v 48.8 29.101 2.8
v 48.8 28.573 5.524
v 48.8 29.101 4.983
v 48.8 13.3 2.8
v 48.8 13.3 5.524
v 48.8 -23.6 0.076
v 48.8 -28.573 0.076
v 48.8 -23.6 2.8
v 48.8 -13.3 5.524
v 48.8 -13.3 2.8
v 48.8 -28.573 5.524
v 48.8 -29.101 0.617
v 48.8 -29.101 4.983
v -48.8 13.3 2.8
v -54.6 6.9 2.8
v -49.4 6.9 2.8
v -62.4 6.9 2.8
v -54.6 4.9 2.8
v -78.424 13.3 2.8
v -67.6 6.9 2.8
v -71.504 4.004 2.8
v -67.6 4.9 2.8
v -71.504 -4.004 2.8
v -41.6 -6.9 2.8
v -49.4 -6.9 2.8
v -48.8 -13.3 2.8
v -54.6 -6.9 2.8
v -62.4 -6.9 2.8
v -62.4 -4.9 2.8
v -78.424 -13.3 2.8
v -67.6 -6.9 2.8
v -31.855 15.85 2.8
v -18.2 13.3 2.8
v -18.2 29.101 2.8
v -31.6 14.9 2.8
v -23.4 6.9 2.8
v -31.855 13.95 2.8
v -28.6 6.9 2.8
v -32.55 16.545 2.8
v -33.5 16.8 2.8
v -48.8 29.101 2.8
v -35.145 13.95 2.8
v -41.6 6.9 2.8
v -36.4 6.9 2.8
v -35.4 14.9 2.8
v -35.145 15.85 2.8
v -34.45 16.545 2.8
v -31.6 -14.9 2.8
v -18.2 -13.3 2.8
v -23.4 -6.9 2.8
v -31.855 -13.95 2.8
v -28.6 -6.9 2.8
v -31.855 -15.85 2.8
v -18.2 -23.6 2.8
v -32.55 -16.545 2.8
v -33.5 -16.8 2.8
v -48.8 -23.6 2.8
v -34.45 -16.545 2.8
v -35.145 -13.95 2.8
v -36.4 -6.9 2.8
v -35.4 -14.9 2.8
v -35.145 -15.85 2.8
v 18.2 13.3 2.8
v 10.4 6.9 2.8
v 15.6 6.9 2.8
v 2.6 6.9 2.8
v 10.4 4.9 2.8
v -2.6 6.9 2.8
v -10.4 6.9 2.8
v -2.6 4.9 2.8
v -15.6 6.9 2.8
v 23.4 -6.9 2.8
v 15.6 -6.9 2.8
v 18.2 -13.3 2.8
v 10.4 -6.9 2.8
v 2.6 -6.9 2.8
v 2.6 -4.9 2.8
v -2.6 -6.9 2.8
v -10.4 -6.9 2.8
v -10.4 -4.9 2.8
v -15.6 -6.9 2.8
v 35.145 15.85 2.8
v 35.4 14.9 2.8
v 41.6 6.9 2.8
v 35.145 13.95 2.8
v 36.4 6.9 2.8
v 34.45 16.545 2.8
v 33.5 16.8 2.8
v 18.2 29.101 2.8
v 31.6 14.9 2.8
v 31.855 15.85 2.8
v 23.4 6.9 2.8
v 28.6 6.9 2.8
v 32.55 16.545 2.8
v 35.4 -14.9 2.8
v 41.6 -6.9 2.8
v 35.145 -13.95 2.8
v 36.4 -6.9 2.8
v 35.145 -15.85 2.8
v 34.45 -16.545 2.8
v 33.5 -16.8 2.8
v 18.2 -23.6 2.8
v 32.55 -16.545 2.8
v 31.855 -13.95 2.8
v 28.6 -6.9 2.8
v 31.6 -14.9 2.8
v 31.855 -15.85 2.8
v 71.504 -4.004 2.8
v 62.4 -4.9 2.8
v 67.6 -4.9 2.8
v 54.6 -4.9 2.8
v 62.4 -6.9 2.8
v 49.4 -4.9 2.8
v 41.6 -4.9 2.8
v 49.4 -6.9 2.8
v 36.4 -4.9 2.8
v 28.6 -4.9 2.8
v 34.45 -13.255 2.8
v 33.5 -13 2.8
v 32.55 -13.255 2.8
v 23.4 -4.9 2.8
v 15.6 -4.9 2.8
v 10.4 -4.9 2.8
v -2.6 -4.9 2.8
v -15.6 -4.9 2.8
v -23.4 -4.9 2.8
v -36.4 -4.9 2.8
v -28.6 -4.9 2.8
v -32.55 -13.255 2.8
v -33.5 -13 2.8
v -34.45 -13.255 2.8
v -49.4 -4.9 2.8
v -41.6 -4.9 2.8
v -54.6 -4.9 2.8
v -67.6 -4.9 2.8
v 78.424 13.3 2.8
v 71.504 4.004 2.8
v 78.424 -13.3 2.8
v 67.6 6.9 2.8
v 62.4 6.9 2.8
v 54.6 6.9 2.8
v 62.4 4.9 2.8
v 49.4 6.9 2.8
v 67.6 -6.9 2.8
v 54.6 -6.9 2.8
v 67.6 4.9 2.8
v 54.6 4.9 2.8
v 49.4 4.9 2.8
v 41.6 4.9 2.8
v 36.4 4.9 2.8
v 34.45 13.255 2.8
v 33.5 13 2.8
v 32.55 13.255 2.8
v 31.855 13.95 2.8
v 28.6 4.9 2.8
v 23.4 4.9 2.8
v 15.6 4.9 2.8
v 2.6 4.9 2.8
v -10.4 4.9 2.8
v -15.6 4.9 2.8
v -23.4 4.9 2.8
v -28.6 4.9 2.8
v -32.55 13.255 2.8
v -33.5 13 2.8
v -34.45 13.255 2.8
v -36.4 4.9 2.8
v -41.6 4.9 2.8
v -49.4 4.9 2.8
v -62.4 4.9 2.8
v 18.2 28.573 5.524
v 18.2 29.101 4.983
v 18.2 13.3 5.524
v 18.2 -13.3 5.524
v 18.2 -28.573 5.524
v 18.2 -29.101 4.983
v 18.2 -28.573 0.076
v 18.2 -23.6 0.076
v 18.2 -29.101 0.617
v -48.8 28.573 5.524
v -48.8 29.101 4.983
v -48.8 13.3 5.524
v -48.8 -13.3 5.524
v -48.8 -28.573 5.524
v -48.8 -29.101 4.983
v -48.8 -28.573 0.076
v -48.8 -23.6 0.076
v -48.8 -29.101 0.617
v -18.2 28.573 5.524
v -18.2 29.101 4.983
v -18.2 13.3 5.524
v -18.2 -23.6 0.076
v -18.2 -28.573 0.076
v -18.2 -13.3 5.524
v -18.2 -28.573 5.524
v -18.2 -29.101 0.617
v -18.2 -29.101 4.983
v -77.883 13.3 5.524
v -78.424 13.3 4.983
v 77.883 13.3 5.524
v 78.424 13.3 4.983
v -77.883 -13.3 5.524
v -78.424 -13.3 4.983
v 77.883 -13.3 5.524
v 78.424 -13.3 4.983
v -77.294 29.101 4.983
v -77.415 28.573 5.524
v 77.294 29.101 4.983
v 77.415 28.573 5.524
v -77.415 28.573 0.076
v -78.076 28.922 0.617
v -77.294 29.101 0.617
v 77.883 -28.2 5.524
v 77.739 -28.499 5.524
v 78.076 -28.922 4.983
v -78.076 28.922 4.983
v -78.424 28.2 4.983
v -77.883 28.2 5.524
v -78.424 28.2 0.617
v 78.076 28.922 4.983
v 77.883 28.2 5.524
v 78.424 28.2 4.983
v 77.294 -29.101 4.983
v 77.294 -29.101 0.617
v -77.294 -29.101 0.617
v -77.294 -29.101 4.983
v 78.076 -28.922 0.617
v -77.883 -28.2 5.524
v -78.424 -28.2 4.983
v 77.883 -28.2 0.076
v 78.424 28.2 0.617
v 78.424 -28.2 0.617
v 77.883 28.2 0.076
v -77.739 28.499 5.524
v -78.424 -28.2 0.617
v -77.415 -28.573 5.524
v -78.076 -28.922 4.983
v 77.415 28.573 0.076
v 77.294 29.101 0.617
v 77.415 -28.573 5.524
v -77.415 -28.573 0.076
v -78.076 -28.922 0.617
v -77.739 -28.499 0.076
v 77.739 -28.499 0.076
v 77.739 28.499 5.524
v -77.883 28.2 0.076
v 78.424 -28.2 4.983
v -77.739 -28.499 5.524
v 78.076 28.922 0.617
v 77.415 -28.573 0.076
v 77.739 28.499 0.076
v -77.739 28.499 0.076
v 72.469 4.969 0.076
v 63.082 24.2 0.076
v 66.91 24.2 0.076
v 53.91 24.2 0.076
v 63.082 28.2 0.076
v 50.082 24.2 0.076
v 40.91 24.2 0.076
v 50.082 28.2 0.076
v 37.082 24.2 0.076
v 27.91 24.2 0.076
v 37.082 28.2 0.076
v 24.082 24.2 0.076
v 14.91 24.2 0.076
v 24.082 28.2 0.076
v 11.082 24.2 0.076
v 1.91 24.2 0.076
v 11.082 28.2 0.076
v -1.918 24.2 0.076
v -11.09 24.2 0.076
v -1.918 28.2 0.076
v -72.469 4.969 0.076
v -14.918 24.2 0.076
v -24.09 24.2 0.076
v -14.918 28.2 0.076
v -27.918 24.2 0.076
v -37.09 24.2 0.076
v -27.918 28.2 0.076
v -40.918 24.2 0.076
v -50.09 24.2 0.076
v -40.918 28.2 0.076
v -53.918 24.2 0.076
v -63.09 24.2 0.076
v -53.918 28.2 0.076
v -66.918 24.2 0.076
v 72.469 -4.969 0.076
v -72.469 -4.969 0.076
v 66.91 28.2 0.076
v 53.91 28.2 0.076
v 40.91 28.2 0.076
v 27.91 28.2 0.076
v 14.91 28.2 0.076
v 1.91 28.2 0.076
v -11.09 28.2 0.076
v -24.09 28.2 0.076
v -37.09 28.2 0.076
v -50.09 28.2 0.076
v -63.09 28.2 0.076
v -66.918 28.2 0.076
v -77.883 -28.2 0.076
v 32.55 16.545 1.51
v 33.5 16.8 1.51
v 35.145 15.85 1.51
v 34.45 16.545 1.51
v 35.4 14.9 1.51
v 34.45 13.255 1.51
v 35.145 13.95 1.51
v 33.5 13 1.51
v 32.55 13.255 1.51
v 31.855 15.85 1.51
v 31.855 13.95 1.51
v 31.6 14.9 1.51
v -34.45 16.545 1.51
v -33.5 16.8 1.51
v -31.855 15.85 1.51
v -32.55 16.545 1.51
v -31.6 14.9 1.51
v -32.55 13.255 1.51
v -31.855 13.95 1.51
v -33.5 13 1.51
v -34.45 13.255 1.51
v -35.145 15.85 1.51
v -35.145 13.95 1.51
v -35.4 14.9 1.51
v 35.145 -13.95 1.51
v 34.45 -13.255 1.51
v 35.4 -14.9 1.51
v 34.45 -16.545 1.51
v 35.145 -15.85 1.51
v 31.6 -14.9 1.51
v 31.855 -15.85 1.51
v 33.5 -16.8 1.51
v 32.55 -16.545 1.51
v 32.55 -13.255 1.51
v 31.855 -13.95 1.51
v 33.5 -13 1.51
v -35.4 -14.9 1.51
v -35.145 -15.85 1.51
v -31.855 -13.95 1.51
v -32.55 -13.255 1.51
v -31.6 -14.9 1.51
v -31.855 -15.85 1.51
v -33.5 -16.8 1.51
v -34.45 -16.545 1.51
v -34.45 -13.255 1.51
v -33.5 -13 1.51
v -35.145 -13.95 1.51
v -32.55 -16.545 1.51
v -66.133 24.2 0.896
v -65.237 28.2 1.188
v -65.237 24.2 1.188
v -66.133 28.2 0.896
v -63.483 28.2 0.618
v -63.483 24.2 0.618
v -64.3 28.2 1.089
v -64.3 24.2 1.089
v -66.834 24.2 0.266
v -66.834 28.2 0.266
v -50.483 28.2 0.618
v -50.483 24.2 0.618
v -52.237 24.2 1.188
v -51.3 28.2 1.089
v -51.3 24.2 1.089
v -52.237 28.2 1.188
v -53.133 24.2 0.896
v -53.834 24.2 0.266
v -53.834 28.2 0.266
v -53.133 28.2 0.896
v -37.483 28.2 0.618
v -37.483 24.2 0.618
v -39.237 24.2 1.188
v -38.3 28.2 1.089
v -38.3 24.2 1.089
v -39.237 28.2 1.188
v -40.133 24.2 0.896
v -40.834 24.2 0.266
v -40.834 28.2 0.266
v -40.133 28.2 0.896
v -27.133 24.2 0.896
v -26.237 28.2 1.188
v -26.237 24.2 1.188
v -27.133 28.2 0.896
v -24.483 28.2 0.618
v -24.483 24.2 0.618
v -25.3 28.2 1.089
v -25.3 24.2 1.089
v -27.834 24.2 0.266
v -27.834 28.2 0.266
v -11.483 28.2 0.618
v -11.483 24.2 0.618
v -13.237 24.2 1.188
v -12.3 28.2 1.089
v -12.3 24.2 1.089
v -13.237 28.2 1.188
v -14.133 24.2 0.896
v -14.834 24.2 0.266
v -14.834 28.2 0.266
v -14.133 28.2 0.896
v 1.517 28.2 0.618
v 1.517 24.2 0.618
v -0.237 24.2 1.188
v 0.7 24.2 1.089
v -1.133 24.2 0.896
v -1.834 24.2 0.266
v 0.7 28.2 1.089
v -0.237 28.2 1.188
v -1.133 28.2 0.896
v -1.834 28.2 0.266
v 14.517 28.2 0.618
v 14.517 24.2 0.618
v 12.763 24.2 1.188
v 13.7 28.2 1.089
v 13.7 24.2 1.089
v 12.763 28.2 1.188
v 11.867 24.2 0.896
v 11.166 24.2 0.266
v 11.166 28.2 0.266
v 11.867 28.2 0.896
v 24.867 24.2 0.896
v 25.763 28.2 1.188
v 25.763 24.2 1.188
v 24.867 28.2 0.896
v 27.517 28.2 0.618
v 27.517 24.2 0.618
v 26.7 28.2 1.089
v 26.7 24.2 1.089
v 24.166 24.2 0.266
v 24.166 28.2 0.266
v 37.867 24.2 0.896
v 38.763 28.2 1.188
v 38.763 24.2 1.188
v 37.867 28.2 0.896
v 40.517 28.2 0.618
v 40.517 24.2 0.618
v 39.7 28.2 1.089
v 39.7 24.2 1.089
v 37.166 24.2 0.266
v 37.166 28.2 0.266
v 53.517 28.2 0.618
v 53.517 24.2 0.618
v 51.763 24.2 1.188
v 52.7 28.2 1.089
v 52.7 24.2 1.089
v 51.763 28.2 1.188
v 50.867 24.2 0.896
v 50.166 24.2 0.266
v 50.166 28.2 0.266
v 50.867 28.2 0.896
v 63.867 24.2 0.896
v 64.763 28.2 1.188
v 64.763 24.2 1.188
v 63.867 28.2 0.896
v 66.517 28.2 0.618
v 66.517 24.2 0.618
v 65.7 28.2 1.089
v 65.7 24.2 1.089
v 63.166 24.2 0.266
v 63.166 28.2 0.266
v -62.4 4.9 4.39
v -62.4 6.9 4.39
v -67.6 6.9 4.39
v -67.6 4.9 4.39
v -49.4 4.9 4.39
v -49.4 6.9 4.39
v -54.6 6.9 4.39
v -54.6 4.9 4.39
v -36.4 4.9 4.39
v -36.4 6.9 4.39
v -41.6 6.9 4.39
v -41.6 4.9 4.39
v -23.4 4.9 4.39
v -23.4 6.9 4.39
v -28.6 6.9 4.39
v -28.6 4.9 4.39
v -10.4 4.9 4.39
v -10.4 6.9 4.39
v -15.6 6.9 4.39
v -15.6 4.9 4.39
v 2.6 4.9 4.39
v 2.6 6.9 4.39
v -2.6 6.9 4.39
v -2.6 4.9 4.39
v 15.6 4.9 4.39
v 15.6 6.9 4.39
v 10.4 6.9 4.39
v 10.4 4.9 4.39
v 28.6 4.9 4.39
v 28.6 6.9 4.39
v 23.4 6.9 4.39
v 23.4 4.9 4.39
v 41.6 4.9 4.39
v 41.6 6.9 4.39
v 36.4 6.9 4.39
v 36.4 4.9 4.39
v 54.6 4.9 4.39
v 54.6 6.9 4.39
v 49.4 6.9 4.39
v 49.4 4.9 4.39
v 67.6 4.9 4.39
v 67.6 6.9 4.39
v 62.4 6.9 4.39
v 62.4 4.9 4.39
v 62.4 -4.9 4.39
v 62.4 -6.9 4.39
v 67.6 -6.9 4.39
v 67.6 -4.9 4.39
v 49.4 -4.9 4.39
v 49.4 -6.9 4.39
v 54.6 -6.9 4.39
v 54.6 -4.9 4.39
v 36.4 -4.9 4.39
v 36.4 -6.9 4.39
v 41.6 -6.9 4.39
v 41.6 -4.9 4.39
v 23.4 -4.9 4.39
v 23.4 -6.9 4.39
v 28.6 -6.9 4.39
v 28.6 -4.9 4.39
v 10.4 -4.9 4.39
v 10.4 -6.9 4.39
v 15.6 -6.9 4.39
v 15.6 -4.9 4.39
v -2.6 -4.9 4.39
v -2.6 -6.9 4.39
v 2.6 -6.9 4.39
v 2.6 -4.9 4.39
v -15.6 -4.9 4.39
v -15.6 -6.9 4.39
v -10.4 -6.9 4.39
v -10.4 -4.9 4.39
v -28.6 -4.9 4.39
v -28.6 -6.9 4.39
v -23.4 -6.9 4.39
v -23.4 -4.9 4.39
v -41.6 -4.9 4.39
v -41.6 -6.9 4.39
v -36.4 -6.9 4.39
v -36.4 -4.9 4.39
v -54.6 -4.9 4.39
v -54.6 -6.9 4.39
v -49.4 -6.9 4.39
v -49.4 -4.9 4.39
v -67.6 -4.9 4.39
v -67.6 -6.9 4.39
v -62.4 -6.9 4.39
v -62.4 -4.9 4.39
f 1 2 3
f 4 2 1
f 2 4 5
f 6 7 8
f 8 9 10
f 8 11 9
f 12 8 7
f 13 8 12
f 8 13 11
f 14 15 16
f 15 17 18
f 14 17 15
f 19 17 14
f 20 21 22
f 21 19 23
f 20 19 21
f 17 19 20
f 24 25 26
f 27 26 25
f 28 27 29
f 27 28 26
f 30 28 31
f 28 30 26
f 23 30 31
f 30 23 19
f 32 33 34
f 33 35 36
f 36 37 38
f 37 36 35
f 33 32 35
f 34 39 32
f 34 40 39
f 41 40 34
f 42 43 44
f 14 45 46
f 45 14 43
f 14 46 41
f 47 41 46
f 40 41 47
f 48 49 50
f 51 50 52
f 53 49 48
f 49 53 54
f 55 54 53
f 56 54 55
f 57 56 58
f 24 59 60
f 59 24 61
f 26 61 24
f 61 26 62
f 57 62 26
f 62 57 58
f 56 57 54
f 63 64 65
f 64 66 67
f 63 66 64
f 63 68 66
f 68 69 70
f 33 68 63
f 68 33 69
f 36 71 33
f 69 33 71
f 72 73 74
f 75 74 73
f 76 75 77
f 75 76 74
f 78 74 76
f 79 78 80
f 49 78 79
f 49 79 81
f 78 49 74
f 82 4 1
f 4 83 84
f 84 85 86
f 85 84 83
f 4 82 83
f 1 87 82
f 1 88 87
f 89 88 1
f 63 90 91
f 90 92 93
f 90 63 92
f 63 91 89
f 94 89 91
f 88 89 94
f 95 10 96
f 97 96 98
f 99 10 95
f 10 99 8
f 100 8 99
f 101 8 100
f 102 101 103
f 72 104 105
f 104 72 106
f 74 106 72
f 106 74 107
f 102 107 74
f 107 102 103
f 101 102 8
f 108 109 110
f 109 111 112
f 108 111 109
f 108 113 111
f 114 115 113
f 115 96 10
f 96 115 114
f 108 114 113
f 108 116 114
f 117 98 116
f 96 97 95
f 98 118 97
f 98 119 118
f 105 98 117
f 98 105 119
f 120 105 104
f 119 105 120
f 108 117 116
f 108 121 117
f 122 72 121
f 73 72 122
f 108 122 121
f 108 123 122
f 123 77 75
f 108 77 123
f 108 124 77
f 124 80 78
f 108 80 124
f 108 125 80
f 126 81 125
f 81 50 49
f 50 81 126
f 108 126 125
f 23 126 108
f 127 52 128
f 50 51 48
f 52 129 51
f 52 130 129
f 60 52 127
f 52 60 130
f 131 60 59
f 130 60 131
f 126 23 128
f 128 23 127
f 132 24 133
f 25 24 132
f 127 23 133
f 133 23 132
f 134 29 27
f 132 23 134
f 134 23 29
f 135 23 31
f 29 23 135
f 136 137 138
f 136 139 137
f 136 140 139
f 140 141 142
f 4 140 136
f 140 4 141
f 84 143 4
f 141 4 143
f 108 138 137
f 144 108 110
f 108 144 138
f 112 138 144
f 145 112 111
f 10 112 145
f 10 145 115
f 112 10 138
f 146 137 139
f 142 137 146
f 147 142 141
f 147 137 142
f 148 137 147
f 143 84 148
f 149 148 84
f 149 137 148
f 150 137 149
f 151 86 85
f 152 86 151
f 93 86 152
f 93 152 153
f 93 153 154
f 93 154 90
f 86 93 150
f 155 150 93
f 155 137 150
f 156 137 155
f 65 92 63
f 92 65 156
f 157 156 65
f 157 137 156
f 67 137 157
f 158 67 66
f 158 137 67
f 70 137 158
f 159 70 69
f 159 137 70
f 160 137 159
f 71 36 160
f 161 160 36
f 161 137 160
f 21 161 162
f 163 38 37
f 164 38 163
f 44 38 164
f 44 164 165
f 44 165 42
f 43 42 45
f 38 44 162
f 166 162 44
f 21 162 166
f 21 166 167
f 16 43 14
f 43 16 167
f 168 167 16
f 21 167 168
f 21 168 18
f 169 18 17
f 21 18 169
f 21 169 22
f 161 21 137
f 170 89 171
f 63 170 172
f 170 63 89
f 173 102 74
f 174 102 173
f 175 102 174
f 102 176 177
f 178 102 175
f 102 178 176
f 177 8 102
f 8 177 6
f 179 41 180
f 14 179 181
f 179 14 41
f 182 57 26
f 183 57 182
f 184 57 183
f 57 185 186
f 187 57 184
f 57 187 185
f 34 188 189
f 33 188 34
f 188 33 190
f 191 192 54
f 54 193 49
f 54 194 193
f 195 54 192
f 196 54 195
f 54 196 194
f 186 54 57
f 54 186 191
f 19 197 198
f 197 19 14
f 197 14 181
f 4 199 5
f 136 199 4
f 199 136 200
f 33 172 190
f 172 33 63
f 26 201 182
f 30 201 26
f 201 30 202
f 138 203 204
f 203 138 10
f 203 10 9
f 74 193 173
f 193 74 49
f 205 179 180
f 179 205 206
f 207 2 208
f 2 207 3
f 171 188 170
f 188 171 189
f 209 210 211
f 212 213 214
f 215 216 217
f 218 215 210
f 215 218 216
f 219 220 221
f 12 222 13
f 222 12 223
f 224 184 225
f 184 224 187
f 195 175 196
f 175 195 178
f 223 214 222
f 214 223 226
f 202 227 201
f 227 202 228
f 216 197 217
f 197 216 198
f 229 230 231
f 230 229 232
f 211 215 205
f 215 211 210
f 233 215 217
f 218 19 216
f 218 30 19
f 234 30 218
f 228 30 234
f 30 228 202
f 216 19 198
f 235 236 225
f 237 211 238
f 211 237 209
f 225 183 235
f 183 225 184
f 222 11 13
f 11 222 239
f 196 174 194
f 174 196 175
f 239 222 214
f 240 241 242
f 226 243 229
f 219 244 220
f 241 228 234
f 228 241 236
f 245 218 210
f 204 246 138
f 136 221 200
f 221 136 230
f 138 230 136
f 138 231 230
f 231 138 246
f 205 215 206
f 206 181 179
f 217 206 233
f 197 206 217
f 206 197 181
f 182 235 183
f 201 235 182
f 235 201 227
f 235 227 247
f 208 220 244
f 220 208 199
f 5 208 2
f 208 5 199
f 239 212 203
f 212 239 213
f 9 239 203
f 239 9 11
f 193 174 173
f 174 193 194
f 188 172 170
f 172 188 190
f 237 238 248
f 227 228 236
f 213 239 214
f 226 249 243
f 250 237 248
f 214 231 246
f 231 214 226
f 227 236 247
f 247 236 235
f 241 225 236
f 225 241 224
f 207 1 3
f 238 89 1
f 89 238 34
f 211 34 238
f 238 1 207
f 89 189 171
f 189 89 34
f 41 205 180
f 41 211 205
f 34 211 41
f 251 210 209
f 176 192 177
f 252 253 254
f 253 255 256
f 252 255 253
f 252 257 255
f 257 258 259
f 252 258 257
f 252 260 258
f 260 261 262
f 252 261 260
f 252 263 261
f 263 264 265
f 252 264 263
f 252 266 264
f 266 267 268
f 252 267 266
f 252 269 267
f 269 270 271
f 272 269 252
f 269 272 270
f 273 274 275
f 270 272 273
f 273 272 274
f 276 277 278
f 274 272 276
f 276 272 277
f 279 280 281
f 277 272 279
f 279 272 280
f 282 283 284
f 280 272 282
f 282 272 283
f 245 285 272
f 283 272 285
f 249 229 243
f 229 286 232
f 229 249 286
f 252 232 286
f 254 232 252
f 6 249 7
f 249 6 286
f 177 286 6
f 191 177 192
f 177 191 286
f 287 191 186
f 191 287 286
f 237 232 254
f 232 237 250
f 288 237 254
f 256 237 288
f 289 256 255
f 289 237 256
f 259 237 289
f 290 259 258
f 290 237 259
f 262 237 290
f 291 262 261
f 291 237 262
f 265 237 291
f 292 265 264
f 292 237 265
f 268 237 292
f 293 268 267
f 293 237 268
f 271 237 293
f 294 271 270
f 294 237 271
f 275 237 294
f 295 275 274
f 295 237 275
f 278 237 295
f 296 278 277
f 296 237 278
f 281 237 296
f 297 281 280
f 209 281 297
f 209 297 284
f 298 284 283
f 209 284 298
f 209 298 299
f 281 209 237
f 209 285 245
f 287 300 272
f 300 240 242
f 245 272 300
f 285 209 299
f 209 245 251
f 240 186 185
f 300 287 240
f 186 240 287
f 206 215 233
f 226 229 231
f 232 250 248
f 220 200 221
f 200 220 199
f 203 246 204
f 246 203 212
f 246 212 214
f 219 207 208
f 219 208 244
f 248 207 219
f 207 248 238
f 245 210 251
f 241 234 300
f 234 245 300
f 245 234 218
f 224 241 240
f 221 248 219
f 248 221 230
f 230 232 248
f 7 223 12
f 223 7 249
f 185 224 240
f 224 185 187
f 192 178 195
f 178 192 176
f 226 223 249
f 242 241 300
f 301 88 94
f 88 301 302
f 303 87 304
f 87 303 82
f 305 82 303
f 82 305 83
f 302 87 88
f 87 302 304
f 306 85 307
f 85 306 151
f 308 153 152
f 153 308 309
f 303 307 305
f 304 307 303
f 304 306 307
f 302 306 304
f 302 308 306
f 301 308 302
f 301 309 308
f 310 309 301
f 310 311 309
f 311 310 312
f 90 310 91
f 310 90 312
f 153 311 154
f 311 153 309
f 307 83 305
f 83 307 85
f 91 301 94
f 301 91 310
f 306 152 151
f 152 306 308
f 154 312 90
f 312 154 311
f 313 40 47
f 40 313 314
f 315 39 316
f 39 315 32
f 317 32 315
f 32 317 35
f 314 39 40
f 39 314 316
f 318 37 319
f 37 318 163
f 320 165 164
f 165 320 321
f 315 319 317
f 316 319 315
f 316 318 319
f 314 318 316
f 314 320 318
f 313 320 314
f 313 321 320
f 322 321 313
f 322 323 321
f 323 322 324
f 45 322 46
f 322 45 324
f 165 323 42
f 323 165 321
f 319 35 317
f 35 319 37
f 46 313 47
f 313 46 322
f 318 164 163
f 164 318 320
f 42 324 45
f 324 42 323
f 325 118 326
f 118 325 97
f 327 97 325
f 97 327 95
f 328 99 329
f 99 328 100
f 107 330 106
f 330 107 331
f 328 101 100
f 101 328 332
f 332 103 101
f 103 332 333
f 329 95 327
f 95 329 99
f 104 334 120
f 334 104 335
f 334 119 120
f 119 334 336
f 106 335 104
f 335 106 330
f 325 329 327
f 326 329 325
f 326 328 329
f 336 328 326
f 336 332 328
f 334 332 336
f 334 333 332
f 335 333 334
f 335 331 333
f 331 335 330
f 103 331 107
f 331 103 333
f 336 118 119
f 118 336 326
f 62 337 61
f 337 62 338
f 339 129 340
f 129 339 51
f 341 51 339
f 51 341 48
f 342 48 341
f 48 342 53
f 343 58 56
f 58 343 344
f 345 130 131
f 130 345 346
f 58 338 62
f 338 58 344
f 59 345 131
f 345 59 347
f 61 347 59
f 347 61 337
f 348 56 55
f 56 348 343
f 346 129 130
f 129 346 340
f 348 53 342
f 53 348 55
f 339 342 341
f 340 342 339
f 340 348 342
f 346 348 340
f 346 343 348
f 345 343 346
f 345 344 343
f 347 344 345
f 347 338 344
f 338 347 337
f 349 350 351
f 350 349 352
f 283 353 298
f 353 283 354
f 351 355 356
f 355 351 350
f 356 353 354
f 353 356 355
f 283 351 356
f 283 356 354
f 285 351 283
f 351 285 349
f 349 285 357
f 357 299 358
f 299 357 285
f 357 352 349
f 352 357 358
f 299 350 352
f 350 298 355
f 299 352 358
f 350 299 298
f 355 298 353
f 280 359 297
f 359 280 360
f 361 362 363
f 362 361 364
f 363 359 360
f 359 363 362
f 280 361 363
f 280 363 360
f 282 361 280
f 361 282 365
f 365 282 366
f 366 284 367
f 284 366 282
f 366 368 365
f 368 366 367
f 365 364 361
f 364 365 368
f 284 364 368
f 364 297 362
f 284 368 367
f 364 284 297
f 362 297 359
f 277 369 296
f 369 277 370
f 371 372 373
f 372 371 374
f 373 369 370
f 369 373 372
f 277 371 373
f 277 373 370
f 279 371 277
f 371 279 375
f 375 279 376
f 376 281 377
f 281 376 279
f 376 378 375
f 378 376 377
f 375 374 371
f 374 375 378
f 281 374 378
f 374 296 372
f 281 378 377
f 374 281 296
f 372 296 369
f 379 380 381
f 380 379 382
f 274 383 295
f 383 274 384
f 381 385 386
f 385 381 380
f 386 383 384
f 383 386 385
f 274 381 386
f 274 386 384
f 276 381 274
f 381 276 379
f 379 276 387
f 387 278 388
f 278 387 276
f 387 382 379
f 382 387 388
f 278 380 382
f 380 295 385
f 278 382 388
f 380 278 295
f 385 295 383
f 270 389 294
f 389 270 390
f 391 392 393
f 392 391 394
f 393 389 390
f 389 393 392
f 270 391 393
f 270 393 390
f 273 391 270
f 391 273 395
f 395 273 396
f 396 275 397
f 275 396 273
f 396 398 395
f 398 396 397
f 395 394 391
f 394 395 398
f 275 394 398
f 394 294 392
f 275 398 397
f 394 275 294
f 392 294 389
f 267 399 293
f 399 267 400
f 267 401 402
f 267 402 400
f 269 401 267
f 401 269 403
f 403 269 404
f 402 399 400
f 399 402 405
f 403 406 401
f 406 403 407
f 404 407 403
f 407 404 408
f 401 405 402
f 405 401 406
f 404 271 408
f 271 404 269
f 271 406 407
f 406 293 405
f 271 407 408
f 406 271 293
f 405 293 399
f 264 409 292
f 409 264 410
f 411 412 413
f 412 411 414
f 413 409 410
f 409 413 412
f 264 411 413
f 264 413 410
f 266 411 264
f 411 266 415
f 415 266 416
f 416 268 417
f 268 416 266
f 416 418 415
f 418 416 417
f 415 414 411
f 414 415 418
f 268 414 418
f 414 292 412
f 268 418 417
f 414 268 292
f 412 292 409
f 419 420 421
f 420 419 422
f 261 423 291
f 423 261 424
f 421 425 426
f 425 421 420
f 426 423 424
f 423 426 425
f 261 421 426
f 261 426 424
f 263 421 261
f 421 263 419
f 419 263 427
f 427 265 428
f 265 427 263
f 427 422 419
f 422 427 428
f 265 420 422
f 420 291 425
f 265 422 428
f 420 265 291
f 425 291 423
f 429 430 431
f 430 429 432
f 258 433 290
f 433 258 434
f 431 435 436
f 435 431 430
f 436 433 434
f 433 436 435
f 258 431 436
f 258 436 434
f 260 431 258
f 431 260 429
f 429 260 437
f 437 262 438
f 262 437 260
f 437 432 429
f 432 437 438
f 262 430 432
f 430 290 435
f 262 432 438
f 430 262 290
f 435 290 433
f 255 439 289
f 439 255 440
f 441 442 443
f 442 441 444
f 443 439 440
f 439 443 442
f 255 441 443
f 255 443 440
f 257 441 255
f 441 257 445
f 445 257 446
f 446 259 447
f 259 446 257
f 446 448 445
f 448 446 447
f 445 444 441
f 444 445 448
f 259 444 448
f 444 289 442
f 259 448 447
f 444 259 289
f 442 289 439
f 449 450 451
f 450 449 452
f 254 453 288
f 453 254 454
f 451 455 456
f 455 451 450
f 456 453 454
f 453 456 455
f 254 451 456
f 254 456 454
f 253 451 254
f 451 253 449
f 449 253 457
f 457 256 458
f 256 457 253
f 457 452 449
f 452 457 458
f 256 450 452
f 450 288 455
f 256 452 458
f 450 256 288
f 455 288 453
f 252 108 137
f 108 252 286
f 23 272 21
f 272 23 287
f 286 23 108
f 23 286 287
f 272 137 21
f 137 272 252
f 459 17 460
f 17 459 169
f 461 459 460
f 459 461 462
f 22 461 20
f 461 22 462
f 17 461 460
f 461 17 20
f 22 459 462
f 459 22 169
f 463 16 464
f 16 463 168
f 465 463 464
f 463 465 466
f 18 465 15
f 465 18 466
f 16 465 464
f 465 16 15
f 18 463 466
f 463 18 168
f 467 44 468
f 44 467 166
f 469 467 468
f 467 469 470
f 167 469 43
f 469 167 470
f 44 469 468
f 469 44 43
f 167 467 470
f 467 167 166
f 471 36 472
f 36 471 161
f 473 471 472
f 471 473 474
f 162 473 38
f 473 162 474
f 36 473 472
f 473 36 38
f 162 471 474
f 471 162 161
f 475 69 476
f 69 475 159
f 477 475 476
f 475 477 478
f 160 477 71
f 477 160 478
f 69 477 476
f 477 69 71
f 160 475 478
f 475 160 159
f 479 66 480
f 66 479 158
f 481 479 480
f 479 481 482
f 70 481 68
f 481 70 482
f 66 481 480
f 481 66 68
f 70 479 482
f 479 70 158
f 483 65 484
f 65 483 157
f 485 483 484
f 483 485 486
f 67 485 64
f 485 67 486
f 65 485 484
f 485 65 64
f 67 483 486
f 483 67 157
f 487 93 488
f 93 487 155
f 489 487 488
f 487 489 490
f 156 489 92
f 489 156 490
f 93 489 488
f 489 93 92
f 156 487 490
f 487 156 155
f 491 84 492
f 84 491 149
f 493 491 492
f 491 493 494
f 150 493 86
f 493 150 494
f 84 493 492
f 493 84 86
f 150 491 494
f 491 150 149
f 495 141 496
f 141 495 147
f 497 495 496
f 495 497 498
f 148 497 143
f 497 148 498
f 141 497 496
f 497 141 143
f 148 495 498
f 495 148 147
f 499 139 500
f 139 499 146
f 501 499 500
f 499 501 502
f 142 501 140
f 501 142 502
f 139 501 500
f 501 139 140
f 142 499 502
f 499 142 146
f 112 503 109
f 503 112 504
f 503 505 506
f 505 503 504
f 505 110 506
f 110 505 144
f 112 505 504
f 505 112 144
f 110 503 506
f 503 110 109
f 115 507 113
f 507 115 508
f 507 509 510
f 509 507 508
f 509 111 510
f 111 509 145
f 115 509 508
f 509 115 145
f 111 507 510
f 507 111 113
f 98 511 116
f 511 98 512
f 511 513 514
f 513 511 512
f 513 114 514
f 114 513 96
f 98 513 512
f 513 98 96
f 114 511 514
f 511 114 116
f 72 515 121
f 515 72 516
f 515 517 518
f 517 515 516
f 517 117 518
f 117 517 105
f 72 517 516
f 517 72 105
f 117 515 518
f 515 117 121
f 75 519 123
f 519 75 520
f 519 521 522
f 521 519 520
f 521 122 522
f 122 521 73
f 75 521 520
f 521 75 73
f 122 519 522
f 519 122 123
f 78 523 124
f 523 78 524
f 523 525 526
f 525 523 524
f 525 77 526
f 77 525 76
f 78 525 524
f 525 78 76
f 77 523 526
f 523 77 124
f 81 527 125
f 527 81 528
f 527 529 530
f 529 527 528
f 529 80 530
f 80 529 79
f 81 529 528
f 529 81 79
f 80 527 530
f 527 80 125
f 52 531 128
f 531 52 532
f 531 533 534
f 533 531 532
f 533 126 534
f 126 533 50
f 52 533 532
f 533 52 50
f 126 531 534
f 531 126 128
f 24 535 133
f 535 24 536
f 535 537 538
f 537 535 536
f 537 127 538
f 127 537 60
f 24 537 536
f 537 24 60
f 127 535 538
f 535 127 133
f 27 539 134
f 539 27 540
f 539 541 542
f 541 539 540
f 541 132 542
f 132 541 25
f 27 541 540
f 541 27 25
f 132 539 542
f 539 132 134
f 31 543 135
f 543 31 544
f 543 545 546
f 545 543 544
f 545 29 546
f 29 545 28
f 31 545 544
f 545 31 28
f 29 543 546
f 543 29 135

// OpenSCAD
// -*- mode: SCAD ; c-file-style: "ellemtel" ; coding: utf-8 -*-
//
// Holder to scan Minox film strips with a Reflecta ProScan 10T
//
// © 2018 Roland Sieker <ospalh@gmail.com>
// Licence: CC-BY-SA 4.0


/* [Global] */


// … to preview. You will get both parts when you click “Create Thing”.
part = "halter"; // [halter: film holder, einsatz: film holder clamp]

// Set this to “render” and click on “Create Thing” when done with the setup.
preview = 1; // [0:render, 1:preview]

/* [Holder] */

// Width of the holder. This one and the next one are the two values you do need to set up for your scanner. Preset is for a Reflecta proScan. Maybe subtract half a millimtre for a better fit.
holder_width = 58.4;  // [20:0.1:150]

// Height or thickness of the holder. See above. You know they were too high when you need a mallet to go from one image to the next…
holder_thickness = 5.6;  // [3:0.1:10]

// How many exposures on the longest strips you want to fit into this. Make sure the resulting holder still fits onto your print bed.
images_per_strip = 11;  // [1:1:20]

/* [Magnets] */

// Diameter of the magnet hole. Add clearance by hand here. Set to 0 for no magnet holes.
magnet_diameter = 3.8;  // [0:0.1:15]
// Height or thickness of the magnet. Make sure to use magnets flat enough to fit.
magnet_height = 1;  // [0.5:0.1:3]

/* [Hidden] */

// Das ganze Filmgrößen-Geraffel wieder verstecken: ein thing pro
// Film. Teil der Automatik (mit/ohne Stege, Lang-oder Kurzkerbe) sind so
// halbwegs inaktiv.


// Width of the film
film_width = 9.2;  // [8:0.1:70]
// Length from the left edge of an exposure to its right edge
image_width = 13; // [8:0.1:100]
// Length from one point (e.g. left edge) of one exposure to the same point of the next exposure. This minus the image width is used for the vertical ridges, if it’s positive.
image_pitch = 13; // [0:0.1:110]
// Size of an exposure from bottom to top.
image_height = 8; // [7:0.1:68]


bildabstand = max(image_pitch, image_width);
l_filmsteg = max(0, bildabstand-image_width);

r_r = 1.0;  // Rundungsradius

// Auch wichtig:
l_zk = 4;  // Länge Zentrierkerbe
b_zk = 4;  // Breite Zentrierkerbe
h_zk = 1.2;  // Tiefe der Zentrierkerbe
w_zk = 1;  // Wand bzw Abstand der Zentrierkerbe vom Rand



l_griff = 30;
o_griff = 30;
w_griff = 5;
magnet_y_off = 0;  // Abstand Magnet vom Einsatz

kurzsteg_grenze = 1;  // Weniger als 1 mm pro Seite: Kurzstege

mit_langsteg = ( ((film_width-image_height)/2) >= kurzsteg_grenze);


w_steg = 2;  // Breite für Stücke, die den Film zentrieren.
l_kurzsteg = 0.4*bildabstand;  // Länge für Stücke, die den Film zentrieren,
// wenn wier keine Fensterstege machen



w_schraeg = 1;  // Breite der Abschrägung rund um die Filmfenster




// *******************************************************
// Extra parameters. These can be changed reasonably safely.


w = 1.8;  // Wall width
p = 1.2;  // Bottom, top plate height
c = 0.6;  // Clearance
c_z = 0.3;  // Clearance in z direction. Mostly for the magnet hole and centering ridge
angle = 60; // Overhangs much below 60° are a problem for me


// Halbwegs wichtig
h_steg = 1.6;  // Höhe für Stücke, die den Film zentrieren.
h_nut = h_steg + c_z;  // Tiefe für Stücke, auf denen der Film nicht aufliegt



// *******************************************************
// Some shortcuts. These shouldn’t be changed

tau = 2 * PI;  // π is still wrong. τ = circumference ÷ r

xy_factor = 1/tan(angle);
// To get from a height to a horizontal width inclined correctly
z_factor = tan(angle);  // The other way around

some_distance = 1.2 * holder_width;
ms = 0.01;  // Muggeseggele.

// fn for differently sized objects and fs, fa; all for preview or rendering.
pna = 40;
pnb = 15;
pa = 5;
ps = 1;
rna = 180;
rnb = 30;
ra = 1;
rs = 0.1;
function na() = (preview) ? pna : rna;
function nb() = (preview) ? pnb : rnb;
$fs = (preview) ? ps : rs;
$fa = (preview) ? pa : ra;

l_fenster = bildabstand * images_per_strip;
l_rand = 2 * w_steg + w_schraeg + 2;
w_rand = w_schraeg + 8;
l_ue_a =  l_fenster + 2*l_rand;
w_einsatz = image_height + 2 * w_rand;
h_bd = holder_thickness/2;  // Höhe Boden oder Deckel

to_griff = l_ue_a/2 - o_griff - l_griff/2;



// *******************************************************
// End setup




// *******************************************************
// Generate the parts


print_part();
// filmhalter();
// einsatz();
// preview_parts();
// stack_parts();



module print_part()
{
   if ("halter" == part)
   {
      filmhalter();
   }
   if ("einsatz" == part)
   {
      einsatz();
   }
}

module preview_parts()
{
   filmhalter();
   translate([0, some_distance, 0])
   {
      einsatz();
   }
}

module stack_parts()
{
   // intersection()
   {
       // color("yellow")
      {
         filmhalter();
      }
      translate([0,0,holder_thickness + ms])
      {
         rotate([0,180,0])
         {
            // color("red")
            {
               einsatz();
            }
         }
      }
   }
}

// *******************************************************
// Code for the parts themselves


module filmhalter()
{
   difference()
   {
      basis_filmhalter();
      fenster();
      magnetausschnitte();
      kerben();
   }
   fensterstege();
   bodenstege();
}

module einsatz()
{
   difference()
   {
      union()
      {
         difference()
         {
            basis_einsatz();
            fenster();
         }
         fensterstege();
      }
      einsatzausschnitte();
      // magnetausschnitte(magnet_diameter/2);
      magnetausschnitte();
   }

}


module basis_filmhalter()
{
   translate([0,0,h_bd])
   {
      difference()
      {
         massiver_halter();
         einsatz_ausschnitt(c);
      }
   }
}


module basis_einsatz()
{
   translate([0,0,h_bd])
   {
      intersection()
      {
         massiver_halter();
         rotate([0,180,0])
         {
            einsatz_ausschnitt(0);
         }
      }
   }

}

module massiver_halter()
{
   hull()
   {
      vosp();
      mirror([0,0,1])
      {
         vosp();
      }
   }

   module vosp()
   {
      tosp();
      mirror([0,1,0])
      {
         tosp();
      }
   }
   module tosp()
   {
      osp();
      mirror([1,0,0])
      {
         osp();
      }

   }

   module osp()
   {
      translate([l_ue_a/2-r_r, holder_width/2-r_r, holder_thickness/2-r_r])
      {
         sphere(r=r_r);
      }
   }
}


module einsatz_ausschnitt(ec)
{
   translate([0, 0, holder_thickness])
   {
      cube([l_ue_a+2*ms, w_einsatz + ec, 2*holder_thickness], center=true);
      grip_cut();
      mirror()
      {
         grip_cut();
      }
   }
   module grip_cut()
   {
      translate([to_griff, 0, 0])
      {
         cube([l_griff + ec, holder_width + 2*ms, 2*holder_thickness], center=true);
         translate([0, -holder_width/2, 0])
         {
            cube([l_griff + ec, 2*w_griff+2*ec, 4*holder_thickness], center=true);
         }
      }
   }
}

module fenster()
{
   translate([0, 0, h_bd])
   {
      hull()
      {
         translate([0,0,-0.5+ms])
         {
            cube([l_fenster, image_height, 1], center=true);
         }
         translate([0,0,-h_bd-0.5-ms])
         {
            cube(
               [l_fenster+2*w_schraeg, image_height+2*w_schraeg, 1], center=true);
         }
      }

   }
}


module magnetausschnitte()
{
   if (magnet_diameter > 0 && magnet_height > 0)
   {
      magnetausschnitt(1, 1);
      magnetausschnitt(-1, 1);
      magnetausschnitt(1, -1);
      magnetausschnitt(-1, -1);
   }
}

module magnetausschnitt(xf, yf)
{
   yo_mag = w_einsatz/2 + magnet_diameter/2 +magnet_y_off;


   // Mittig in den Griffen.
   translate(
      [xf * (to_griff), yf * (yo_mag), h_bd - magnet_height-c_z + ms])
   {
      cylinder(d=magnet_diameter, h=magnet_height+c_z);  // N.B. Spiel ist schon im magnet_diameter
      // eingerechnet
   }
}

module bodenstege()
{
   translate([0, 0, -ms+h_steg/2+h_bd])
   {
      if (mit_langsteg)
      {
         langbodensteg();
         rotate(180)
         {
            langbodensteg();
         }
      }
      else
      {
         kurzbodenstege();
         rotate(180)
         {
            kurzbodenstege();
         }
      }
   }
   module langbodensteg()
   {
      translate([0,w_steg/2+film_width/2+c/2, 0])
      {
         cube([l_fenster, w_steg, h_steg], center=true);
      }
   }
   module kurzbodenstege()
   {
      for (i=[0:images_per_strip-1])
      {
         translate([-l_fenster/2 + (0.5 + i) * bildabstand, w_steg/2+film_width/2+c/2, 0])
         {
            cube([l_kurzsteg, w_steg, h_steg], center=true);
         }
      }
   }
}

module einsatzausschnitte()
{
   translate([0, 0, h_bd + ms-h_nut/2])
   {
      if (mit_langsteg)
      {
         langausschnitt();
         rotate(180)
         {
            langausschnitt();
         }
      }
      else
      {
         kurzausschnitte();
         rotate(180)
         {
            kurzausschnitte();
         }
      }
   }
   module langausschnitt()
   {
      translate([0,w_steg/2+film_width/2+c/2,0])
      {
         cube([l_fenster+6*c, w_steg+2*c, h_nut], center=true);
      }
   }
   module kurzausschnitte()
   {
      for (i=[0:images_per_strip-1])
      {
         translate([-l_fenster/2 + (0.5 + i) * bildabstand, w_steg/2+film_width/2+c/2-film_width/4 + image_height/4, 0])
         {
            cube([l_kurzsteg+2*c, w_steg+2*c+film_width/2 - image_height/2, h_nut], center=true);
         }
      }
   }
}


module fensterstege()
{
   if (l_filmsteg > 0)
   {
      for (i=[1:images_per_strip-1])
      {
         translate([-l_fenster/2 + i * bildabstand, 0, h_bd/2-ms])
         {
            cube([l_filmsteg, image_height+2*w_schraeg + 2*ms ,h_bd], center=true);
         }
      }
   }
}

module kerben()
{
   // Den Radius der Zentrierkerbe kann mensch per Pythagoras bestimmen.
   // Hypothenuse = r_zk
   // 1. Kathete = l_zk/2
   // 2. Kathete = r_zk - h_zk
   // h_zk > 0
   // r_zk * r_zk = l_zk * l_zk / 4 + r_zk * r_zk - 2 * r_zk * h_zk + h_zk * h_zk
   // 0 = l_zk * l_zk / 4 - 2 * r_zk * h_zk + h_zk * h_zk
   // 2 * r_zk * h_zk =
   r_zk = (l_zk * l_zk / 4 + h_zk * h_zk) / (2 * h_zk);
   for (i=[0:images_per_strip-1])
   {
      translate(
         [-l_fenster/2 + i * bildabstand + bildabstand/2, holder_width/2 - w_zk, h_zk-r_zk])
      {
         rotate([90,0,0])
         {
            cylinder(r=r_zk, h=b_zk);
         }
      }
   }

}
